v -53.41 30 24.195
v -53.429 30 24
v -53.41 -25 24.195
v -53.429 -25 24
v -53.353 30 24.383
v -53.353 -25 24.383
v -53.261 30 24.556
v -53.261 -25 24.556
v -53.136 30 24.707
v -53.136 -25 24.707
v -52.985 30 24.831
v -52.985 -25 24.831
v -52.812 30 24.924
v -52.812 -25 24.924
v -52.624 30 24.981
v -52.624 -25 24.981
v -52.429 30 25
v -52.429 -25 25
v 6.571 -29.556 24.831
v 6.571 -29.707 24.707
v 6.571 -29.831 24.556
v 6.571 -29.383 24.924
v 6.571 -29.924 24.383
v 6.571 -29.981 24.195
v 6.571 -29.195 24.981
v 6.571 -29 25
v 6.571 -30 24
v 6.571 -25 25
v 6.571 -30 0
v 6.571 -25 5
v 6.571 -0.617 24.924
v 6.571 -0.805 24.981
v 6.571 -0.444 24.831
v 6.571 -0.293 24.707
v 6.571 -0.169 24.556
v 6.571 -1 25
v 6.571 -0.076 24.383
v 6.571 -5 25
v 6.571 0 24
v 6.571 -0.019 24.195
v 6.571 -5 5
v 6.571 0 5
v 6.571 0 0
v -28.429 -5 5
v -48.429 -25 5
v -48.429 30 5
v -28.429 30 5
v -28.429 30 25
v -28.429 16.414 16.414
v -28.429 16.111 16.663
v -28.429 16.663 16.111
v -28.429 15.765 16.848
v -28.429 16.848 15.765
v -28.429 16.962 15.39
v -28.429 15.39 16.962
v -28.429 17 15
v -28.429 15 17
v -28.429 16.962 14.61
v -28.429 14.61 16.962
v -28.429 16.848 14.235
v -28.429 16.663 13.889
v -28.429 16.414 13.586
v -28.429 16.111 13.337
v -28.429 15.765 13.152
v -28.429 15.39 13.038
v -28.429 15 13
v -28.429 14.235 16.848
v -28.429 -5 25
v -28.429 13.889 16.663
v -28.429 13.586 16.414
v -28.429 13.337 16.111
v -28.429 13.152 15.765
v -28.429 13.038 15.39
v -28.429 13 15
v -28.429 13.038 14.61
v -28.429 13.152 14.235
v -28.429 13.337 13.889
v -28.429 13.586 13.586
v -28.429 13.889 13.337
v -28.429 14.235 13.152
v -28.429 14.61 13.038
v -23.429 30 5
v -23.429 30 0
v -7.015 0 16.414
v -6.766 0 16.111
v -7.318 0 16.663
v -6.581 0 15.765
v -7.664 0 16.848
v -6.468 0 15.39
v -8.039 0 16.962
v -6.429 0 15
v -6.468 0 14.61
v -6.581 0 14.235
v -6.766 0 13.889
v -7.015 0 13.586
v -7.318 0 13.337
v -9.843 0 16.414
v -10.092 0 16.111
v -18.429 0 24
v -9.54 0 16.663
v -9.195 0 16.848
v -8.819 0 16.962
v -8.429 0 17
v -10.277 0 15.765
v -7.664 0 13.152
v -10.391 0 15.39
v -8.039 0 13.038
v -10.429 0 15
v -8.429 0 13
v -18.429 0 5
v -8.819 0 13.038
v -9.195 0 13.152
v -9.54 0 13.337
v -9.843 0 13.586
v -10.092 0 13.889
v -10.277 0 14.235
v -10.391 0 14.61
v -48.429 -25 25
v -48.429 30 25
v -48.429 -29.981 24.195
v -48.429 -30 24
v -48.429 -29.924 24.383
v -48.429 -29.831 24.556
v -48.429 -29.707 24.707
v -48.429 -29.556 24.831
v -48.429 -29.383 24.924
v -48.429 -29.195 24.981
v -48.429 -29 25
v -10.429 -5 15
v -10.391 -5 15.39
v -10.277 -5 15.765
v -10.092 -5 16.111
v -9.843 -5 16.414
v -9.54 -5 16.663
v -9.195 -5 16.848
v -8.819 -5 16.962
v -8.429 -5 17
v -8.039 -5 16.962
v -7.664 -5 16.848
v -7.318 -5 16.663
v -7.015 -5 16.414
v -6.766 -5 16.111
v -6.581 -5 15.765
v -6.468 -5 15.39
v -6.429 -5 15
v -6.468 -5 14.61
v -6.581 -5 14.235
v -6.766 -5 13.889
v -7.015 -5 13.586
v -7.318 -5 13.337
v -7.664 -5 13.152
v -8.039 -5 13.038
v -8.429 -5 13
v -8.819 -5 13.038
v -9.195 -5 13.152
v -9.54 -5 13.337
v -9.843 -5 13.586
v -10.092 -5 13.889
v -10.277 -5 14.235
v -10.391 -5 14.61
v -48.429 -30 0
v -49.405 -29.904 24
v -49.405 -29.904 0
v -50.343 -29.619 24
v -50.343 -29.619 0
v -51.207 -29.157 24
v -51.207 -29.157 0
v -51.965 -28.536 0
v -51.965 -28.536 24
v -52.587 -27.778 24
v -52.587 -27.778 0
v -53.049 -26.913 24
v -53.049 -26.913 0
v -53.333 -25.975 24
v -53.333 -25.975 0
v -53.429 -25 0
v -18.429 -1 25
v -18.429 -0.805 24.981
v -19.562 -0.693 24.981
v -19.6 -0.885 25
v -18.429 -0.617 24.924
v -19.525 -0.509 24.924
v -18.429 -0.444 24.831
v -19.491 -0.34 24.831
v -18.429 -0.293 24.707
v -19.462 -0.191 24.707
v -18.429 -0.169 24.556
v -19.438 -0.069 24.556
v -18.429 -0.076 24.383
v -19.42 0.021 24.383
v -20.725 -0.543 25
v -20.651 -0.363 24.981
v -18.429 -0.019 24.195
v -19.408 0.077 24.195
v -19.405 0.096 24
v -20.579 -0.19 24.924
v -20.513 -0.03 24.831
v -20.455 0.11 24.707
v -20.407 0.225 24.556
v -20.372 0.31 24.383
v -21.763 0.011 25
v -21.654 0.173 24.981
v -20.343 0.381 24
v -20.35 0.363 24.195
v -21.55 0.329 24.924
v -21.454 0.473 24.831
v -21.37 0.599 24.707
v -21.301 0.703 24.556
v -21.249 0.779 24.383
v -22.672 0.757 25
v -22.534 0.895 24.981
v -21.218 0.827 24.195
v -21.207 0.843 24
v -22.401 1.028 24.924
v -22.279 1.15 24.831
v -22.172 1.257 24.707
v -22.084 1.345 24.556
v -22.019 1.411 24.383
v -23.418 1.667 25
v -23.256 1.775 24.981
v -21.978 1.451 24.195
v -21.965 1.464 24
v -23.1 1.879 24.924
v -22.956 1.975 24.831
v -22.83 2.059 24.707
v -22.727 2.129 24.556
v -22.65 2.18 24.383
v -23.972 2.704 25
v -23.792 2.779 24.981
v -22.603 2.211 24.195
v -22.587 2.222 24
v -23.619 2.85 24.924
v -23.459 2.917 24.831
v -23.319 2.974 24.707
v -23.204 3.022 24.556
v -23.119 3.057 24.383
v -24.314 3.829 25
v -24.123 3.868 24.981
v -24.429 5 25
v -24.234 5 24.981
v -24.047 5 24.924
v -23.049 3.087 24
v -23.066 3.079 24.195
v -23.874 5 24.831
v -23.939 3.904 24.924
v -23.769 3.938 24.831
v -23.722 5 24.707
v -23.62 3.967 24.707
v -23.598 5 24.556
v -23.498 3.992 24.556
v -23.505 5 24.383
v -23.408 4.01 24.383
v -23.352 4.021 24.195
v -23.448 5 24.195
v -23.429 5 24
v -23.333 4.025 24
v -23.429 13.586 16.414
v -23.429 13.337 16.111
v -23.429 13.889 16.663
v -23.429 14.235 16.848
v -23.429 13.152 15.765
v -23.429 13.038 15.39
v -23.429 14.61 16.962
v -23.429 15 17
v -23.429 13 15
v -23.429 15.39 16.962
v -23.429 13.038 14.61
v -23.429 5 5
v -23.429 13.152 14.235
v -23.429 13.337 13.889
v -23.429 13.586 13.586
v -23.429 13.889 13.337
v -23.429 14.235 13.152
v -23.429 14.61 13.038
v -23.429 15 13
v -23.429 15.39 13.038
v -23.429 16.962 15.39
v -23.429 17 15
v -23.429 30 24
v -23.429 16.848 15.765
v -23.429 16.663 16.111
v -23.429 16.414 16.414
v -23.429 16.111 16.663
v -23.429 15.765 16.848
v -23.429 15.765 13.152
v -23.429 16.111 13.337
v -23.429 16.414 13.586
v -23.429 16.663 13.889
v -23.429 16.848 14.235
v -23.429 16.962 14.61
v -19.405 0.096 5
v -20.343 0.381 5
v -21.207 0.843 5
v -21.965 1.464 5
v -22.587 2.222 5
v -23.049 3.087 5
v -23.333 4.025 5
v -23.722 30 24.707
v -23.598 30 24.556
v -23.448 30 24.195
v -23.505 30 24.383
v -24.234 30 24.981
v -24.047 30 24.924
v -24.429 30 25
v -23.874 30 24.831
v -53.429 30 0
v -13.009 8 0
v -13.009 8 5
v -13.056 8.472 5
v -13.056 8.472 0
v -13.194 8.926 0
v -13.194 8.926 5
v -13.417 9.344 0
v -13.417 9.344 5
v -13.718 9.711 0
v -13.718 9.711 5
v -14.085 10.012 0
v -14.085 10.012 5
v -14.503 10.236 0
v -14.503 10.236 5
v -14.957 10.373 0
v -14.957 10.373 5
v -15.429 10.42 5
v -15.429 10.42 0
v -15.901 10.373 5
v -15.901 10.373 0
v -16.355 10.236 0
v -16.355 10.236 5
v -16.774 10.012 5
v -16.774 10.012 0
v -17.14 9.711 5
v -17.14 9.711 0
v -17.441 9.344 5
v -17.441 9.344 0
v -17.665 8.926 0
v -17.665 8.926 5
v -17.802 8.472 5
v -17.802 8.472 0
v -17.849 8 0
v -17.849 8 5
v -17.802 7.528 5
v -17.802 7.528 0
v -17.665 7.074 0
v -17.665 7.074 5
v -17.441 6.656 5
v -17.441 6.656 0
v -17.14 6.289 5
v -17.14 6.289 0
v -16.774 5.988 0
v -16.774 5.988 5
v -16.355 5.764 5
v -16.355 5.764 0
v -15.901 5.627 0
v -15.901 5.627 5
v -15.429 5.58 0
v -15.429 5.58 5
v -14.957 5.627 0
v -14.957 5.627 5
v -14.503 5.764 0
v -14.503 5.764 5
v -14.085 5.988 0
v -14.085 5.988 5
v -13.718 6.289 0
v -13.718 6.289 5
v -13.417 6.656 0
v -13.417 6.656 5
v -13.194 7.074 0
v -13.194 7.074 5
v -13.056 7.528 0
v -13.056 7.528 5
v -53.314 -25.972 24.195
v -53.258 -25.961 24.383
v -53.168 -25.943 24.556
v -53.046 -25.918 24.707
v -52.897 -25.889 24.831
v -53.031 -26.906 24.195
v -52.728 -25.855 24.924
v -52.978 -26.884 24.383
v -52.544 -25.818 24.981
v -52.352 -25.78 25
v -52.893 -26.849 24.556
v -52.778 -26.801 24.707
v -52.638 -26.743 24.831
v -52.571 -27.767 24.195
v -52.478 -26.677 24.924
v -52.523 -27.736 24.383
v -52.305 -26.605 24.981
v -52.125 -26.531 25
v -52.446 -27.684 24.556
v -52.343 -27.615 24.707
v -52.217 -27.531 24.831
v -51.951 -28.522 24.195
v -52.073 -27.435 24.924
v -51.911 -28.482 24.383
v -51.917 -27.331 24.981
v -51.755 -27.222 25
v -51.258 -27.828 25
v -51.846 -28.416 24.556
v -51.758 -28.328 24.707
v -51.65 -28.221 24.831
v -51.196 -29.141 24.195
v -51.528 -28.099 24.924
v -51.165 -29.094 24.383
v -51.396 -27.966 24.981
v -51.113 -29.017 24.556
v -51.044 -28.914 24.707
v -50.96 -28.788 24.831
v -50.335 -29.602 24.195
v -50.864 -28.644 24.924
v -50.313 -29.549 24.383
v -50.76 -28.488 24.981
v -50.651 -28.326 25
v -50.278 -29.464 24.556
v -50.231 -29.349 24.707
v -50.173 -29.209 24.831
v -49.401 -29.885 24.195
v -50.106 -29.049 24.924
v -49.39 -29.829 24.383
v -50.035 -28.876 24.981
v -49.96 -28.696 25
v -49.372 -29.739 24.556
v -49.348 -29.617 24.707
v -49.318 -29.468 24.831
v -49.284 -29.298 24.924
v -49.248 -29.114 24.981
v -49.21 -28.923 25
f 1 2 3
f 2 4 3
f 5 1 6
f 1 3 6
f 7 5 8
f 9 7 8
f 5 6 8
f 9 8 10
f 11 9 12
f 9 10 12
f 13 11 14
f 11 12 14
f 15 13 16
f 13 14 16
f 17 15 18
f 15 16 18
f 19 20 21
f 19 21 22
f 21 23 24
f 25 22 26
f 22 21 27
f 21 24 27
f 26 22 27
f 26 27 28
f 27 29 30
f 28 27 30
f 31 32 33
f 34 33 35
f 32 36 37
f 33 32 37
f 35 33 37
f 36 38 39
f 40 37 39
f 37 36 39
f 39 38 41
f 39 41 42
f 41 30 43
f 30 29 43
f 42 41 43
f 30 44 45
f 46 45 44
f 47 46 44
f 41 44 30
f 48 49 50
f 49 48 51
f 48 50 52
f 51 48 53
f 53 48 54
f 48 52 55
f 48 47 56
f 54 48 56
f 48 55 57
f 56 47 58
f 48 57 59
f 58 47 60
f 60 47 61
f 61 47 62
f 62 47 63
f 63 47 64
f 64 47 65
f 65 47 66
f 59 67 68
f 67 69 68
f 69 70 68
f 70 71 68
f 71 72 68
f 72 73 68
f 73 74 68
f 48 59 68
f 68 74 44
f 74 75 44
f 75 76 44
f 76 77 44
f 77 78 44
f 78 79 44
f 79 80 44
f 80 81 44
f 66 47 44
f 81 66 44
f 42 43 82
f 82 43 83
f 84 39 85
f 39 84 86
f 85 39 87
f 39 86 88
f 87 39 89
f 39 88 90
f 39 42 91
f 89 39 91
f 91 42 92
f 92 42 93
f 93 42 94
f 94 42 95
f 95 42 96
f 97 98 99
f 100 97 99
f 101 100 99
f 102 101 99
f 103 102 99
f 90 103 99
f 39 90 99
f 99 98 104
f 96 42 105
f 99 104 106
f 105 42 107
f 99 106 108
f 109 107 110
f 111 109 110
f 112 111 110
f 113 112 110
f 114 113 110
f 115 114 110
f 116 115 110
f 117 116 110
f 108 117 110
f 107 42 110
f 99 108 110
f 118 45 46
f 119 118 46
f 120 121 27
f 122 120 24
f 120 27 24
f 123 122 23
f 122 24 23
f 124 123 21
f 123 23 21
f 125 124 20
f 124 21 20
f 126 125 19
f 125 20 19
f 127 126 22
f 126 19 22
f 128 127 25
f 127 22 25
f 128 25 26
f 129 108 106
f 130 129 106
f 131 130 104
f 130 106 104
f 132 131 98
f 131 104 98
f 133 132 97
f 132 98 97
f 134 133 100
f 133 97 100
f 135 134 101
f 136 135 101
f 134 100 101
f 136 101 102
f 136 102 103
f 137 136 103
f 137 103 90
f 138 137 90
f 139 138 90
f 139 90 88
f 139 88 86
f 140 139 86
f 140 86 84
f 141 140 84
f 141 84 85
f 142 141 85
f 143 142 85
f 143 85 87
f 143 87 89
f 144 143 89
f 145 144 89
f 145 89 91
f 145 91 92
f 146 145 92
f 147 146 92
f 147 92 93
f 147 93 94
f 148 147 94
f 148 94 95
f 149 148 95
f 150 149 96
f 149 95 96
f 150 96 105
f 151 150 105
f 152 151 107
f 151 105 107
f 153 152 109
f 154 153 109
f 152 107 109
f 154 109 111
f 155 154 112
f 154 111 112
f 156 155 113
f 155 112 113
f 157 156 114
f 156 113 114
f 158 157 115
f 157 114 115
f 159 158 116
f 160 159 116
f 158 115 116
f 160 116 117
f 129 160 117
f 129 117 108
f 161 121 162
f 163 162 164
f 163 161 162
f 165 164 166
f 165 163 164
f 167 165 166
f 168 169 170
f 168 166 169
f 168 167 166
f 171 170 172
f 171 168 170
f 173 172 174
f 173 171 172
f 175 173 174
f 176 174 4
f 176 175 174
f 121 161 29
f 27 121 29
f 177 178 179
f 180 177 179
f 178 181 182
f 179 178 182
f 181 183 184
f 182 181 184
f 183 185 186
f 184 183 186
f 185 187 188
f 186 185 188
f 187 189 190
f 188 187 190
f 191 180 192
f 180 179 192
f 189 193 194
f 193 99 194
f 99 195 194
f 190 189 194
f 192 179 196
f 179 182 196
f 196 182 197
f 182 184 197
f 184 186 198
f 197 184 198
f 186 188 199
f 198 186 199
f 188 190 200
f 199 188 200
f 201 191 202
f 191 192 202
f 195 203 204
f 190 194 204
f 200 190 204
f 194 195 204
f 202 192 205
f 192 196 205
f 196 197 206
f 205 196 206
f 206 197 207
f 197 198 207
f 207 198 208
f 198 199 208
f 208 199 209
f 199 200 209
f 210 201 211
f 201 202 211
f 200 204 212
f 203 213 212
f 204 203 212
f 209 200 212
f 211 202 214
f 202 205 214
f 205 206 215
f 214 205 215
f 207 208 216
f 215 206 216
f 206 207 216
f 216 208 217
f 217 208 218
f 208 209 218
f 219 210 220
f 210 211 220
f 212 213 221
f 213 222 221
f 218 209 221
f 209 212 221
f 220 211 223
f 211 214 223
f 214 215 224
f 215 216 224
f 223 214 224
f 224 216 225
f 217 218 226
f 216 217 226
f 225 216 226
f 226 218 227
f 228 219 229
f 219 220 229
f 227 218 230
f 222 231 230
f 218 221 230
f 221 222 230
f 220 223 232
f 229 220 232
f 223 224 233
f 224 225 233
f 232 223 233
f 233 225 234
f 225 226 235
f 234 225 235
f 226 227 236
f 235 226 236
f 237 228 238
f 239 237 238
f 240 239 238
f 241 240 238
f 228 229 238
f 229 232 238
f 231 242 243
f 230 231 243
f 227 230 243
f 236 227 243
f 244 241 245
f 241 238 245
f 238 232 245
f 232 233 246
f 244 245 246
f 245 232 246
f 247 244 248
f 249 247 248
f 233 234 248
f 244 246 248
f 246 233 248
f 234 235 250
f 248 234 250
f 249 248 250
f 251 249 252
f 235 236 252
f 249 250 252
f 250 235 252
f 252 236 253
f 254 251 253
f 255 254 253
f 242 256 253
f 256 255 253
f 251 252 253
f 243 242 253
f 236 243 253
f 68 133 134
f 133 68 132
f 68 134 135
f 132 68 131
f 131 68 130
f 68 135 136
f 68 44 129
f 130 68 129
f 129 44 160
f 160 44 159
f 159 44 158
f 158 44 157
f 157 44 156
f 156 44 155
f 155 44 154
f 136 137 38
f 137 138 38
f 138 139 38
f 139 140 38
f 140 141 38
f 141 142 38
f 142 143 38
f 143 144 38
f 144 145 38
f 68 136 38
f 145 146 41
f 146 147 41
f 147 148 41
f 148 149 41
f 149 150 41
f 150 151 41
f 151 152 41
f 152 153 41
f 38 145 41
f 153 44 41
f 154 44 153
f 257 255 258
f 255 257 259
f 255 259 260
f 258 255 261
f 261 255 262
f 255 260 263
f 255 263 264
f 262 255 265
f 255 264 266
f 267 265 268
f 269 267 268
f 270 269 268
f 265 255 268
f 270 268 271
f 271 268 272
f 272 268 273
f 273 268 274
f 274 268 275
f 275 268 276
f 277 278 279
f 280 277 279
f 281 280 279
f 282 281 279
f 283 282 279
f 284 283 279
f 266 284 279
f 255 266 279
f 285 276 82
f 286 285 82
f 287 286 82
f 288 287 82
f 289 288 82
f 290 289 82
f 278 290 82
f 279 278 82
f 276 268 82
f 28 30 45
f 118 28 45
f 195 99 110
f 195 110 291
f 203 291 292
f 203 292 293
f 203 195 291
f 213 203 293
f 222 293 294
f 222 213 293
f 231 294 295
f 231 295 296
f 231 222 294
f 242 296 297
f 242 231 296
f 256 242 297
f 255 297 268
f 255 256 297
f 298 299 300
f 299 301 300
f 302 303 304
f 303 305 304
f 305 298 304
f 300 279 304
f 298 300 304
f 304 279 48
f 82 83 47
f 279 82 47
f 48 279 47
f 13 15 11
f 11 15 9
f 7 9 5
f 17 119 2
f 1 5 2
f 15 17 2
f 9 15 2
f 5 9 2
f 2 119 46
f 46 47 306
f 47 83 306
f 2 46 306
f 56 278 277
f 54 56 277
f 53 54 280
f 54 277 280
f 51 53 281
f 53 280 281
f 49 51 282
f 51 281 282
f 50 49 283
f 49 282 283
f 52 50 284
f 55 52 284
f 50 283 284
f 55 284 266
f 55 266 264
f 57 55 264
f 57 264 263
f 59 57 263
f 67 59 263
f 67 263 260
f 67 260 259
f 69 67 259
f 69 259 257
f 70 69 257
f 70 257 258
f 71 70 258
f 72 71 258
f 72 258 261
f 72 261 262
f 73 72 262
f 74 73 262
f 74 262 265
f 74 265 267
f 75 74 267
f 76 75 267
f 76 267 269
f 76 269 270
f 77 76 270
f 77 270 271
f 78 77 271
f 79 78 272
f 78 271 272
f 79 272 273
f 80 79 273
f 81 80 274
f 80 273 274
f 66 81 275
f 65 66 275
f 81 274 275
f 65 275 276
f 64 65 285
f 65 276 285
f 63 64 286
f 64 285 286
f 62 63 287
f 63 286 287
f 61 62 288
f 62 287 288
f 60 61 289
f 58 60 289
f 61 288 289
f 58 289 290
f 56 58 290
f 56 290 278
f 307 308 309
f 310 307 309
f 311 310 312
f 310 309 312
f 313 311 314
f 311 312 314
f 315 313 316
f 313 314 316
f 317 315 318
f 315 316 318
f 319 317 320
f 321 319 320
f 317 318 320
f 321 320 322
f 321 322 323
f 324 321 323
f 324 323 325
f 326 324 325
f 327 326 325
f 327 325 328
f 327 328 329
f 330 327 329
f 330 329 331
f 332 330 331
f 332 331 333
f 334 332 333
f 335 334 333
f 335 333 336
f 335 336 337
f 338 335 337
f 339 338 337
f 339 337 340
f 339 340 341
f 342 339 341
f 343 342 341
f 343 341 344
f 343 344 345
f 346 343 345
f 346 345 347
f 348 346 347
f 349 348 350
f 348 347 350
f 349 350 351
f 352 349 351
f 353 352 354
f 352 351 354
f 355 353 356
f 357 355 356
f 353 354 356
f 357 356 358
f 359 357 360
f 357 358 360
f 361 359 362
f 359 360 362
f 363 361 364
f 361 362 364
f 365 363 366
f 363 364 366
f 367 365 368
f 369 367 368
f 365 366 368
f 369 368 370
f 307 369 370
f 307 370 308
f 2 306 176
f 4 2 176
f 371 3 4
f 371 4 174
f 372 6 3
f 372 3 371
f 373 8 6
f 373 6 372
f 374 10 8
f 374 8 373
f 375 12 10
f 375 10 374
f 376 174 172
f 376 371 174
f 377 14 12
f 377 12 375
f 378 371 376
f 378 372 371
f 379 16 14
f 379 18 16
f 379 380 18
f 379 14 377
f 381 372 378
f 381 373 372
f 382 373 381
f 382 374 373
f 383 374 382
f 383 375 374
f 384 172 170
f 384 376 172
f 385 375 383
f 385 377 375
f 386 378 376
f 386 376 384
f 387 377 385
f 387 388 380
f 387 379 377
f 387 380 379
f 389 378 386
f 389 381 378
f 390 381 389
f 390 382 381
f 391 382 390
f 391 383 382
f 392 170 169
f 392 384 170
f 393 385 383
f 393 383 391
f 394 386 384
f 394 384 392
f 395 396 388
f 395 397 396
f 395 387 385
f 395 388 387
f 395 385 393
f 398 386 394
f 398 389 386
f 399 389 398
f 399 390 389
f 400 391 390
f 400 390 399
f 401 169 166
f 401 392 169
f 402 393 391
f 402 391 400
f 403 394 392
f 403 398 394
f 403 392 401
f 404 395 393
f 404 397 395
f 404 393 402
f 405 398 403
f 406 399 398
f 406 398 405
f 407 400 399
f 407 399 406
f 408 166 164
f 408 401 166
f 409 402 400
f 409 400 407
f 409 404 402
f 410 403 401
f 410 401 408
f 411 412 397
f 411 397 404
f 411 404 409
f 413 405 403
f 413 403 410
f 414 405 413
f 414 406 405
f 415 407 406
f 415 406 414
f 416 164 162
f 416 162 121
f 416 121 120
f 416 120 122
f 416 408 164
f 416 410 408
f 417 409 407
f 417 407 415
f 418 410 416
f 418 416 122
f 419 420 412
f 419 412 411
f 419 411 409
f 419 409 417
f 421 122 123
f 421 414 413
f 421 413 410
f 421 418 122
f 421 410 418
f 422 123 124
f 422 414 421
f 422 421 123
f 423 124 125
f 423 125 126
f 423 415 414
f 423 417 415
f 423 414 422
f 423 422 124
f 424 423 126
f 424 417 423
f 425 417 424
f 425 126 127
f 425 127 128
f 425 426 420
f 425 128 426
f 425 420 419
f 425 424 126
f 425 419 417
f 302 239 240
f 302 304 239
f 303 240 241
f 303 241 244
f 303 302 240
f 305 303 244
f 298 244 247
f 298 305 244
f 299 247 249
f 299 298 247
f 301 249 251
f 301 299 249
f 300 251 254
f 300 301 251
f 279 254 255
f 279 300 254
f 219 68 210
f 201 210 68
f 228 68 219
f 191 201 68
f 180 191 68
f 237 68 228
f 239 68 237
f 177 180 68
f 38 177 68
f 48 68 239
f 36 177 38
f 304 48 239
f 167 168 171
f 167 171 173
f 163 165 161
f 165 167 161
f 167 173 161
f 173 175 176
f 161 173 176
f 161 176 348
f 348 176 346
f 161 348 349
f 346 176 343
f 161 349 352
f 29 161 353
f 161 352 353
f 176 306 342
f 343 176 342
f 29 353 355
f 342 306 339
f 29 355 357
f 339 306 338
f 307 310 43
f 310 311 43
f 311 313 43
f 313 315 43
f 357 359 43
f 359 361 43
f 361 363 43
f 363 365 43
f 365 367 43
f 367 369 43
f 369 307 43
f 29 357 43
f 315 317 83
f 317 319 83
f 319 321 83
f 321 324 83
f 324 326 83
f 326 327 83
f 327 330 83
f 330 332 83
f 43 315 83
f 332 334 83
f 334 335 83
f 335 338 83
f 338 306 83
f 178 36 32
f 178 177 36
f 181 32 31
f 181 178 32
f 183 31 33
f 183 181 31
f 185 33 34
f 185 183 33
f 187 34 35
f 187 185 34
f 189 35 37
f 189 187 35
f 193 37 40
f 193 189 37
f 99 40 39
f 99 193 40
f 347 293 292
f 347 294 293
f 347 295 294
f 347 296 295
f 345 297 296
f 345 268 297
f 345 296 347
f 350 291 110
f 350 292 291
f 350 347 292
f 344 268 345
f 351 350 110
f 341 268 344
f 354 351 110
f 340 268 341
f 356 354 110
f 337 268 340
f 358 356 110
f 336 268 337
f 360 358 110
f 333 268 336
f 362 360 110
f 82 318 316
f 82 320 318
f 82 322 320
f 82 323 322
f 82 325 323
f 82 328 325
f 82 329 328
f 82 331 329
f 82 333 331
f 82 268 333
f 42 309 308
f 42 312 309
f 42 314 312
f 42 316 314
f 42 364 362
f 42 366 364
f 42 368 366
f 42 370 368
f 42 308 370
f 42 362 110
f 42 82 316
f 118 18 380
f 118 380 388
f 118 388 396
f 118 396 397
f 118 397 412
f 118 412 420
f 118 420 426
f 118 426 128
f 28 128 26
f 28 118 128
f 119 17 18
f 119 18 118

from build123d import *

# Parameters (mm, degrees)
F1_DEPTH  = 5
F3_DEPTH  = 20
F6_R      = 2.4197546063
F7_DEPTH  = 25
F8_R      = 5
F9_R      = 5
F10_R     = 1
F4_R      = 2
F11_DEPTH = 10
F5_R      = 2
F12_DEPTH = 10


with BuildPart() as f1:
    # F0 (on Top) → F1 (new body)
    with BuildSketch(Plane.XY):
        Polygon((-23.4292047727, 30), (-53.4292047727, 30), (-53.4292047727, -30), (6.5707952273, -30), (6.5707952273, 0), align=None)
    extrude(amount=F1_DEPTH)

    # F2 (on face) → F3 (join)
    with BuildSketch(Plane.XY.offset(5)):
        Polygon((6.5707952273, -30), (6.5707952273, -25), (-48.4292047727, -25), (-48.4292047727, 30), (-53.4292047727, 30), (-53.4292047727, -30), align=None)
        Polygon((-28.4292047727, 30), (-28.4292047727, -5), (6.5707952273, -5), (6.5707952273, 0), (-23.4292047727, 0), (-23.4292047727, 30), align=None)
    extrude(amount=F3_DEPTH)

    # F6 (on face) → F7 (cut)
    with BuildSketch(Plane.XY.offset(5)):
        with Locations((-15.4292047727, 8)):
            Circle(F6_R)
    extrude(amount=-F7_DEPTH, mode=Mode.SUBTRACT)

    # F8
    f8_edges = [f1.edges().sort_by_distance(p)[0] for p in [
        (-23.429205, 0, 15),
    ]]
    fillet(f8_edges, radius=F8_R)

    # F9
    f9_edges = [f1.edges().sort_by_distance(p)[0] for p in [
        (-53.429205, -30, 12.5),
    ]]
    fillet(f9_edges, radius=F9_R)

    # F10
    f10_edges = [f1.edges().sort_by_distance(p)[0] for p in [
        (-20.929205, -30, 25),
        (-23.429205, 17.5, 25),
        (-53.429205, 2.5, 25),
        (-51.964739, -28.535534, 25),
        (-5.929205, 0, 25),
        (-21.964739, 1.464466, 25),
    ]]
    fillet(f10_edges, radius=F10_R)

    # F4 (on face) → F11 (cut)
    with BuildSketch(Plane.YZ.offset(-23.4292047727)):
        with Locations((15, 15)):
            Circle(F4_R)
    extrude(amount=-F11_DEPTH, mode=Mode.SUBTRACT)

    # F5 (on face) → F12 (cut)
    with BuildSketch(Plane(origin=(0, 0, 0), x_dir=(-1, 0, 0), z_dir=(0, 1, 0))):
        with Locations((8.4292047727, 15)):
            Circle(F5_R)
    extrude(amount=-F12_DEPTH, mode=Mode.SUBTRACT)


solid = f1.part
